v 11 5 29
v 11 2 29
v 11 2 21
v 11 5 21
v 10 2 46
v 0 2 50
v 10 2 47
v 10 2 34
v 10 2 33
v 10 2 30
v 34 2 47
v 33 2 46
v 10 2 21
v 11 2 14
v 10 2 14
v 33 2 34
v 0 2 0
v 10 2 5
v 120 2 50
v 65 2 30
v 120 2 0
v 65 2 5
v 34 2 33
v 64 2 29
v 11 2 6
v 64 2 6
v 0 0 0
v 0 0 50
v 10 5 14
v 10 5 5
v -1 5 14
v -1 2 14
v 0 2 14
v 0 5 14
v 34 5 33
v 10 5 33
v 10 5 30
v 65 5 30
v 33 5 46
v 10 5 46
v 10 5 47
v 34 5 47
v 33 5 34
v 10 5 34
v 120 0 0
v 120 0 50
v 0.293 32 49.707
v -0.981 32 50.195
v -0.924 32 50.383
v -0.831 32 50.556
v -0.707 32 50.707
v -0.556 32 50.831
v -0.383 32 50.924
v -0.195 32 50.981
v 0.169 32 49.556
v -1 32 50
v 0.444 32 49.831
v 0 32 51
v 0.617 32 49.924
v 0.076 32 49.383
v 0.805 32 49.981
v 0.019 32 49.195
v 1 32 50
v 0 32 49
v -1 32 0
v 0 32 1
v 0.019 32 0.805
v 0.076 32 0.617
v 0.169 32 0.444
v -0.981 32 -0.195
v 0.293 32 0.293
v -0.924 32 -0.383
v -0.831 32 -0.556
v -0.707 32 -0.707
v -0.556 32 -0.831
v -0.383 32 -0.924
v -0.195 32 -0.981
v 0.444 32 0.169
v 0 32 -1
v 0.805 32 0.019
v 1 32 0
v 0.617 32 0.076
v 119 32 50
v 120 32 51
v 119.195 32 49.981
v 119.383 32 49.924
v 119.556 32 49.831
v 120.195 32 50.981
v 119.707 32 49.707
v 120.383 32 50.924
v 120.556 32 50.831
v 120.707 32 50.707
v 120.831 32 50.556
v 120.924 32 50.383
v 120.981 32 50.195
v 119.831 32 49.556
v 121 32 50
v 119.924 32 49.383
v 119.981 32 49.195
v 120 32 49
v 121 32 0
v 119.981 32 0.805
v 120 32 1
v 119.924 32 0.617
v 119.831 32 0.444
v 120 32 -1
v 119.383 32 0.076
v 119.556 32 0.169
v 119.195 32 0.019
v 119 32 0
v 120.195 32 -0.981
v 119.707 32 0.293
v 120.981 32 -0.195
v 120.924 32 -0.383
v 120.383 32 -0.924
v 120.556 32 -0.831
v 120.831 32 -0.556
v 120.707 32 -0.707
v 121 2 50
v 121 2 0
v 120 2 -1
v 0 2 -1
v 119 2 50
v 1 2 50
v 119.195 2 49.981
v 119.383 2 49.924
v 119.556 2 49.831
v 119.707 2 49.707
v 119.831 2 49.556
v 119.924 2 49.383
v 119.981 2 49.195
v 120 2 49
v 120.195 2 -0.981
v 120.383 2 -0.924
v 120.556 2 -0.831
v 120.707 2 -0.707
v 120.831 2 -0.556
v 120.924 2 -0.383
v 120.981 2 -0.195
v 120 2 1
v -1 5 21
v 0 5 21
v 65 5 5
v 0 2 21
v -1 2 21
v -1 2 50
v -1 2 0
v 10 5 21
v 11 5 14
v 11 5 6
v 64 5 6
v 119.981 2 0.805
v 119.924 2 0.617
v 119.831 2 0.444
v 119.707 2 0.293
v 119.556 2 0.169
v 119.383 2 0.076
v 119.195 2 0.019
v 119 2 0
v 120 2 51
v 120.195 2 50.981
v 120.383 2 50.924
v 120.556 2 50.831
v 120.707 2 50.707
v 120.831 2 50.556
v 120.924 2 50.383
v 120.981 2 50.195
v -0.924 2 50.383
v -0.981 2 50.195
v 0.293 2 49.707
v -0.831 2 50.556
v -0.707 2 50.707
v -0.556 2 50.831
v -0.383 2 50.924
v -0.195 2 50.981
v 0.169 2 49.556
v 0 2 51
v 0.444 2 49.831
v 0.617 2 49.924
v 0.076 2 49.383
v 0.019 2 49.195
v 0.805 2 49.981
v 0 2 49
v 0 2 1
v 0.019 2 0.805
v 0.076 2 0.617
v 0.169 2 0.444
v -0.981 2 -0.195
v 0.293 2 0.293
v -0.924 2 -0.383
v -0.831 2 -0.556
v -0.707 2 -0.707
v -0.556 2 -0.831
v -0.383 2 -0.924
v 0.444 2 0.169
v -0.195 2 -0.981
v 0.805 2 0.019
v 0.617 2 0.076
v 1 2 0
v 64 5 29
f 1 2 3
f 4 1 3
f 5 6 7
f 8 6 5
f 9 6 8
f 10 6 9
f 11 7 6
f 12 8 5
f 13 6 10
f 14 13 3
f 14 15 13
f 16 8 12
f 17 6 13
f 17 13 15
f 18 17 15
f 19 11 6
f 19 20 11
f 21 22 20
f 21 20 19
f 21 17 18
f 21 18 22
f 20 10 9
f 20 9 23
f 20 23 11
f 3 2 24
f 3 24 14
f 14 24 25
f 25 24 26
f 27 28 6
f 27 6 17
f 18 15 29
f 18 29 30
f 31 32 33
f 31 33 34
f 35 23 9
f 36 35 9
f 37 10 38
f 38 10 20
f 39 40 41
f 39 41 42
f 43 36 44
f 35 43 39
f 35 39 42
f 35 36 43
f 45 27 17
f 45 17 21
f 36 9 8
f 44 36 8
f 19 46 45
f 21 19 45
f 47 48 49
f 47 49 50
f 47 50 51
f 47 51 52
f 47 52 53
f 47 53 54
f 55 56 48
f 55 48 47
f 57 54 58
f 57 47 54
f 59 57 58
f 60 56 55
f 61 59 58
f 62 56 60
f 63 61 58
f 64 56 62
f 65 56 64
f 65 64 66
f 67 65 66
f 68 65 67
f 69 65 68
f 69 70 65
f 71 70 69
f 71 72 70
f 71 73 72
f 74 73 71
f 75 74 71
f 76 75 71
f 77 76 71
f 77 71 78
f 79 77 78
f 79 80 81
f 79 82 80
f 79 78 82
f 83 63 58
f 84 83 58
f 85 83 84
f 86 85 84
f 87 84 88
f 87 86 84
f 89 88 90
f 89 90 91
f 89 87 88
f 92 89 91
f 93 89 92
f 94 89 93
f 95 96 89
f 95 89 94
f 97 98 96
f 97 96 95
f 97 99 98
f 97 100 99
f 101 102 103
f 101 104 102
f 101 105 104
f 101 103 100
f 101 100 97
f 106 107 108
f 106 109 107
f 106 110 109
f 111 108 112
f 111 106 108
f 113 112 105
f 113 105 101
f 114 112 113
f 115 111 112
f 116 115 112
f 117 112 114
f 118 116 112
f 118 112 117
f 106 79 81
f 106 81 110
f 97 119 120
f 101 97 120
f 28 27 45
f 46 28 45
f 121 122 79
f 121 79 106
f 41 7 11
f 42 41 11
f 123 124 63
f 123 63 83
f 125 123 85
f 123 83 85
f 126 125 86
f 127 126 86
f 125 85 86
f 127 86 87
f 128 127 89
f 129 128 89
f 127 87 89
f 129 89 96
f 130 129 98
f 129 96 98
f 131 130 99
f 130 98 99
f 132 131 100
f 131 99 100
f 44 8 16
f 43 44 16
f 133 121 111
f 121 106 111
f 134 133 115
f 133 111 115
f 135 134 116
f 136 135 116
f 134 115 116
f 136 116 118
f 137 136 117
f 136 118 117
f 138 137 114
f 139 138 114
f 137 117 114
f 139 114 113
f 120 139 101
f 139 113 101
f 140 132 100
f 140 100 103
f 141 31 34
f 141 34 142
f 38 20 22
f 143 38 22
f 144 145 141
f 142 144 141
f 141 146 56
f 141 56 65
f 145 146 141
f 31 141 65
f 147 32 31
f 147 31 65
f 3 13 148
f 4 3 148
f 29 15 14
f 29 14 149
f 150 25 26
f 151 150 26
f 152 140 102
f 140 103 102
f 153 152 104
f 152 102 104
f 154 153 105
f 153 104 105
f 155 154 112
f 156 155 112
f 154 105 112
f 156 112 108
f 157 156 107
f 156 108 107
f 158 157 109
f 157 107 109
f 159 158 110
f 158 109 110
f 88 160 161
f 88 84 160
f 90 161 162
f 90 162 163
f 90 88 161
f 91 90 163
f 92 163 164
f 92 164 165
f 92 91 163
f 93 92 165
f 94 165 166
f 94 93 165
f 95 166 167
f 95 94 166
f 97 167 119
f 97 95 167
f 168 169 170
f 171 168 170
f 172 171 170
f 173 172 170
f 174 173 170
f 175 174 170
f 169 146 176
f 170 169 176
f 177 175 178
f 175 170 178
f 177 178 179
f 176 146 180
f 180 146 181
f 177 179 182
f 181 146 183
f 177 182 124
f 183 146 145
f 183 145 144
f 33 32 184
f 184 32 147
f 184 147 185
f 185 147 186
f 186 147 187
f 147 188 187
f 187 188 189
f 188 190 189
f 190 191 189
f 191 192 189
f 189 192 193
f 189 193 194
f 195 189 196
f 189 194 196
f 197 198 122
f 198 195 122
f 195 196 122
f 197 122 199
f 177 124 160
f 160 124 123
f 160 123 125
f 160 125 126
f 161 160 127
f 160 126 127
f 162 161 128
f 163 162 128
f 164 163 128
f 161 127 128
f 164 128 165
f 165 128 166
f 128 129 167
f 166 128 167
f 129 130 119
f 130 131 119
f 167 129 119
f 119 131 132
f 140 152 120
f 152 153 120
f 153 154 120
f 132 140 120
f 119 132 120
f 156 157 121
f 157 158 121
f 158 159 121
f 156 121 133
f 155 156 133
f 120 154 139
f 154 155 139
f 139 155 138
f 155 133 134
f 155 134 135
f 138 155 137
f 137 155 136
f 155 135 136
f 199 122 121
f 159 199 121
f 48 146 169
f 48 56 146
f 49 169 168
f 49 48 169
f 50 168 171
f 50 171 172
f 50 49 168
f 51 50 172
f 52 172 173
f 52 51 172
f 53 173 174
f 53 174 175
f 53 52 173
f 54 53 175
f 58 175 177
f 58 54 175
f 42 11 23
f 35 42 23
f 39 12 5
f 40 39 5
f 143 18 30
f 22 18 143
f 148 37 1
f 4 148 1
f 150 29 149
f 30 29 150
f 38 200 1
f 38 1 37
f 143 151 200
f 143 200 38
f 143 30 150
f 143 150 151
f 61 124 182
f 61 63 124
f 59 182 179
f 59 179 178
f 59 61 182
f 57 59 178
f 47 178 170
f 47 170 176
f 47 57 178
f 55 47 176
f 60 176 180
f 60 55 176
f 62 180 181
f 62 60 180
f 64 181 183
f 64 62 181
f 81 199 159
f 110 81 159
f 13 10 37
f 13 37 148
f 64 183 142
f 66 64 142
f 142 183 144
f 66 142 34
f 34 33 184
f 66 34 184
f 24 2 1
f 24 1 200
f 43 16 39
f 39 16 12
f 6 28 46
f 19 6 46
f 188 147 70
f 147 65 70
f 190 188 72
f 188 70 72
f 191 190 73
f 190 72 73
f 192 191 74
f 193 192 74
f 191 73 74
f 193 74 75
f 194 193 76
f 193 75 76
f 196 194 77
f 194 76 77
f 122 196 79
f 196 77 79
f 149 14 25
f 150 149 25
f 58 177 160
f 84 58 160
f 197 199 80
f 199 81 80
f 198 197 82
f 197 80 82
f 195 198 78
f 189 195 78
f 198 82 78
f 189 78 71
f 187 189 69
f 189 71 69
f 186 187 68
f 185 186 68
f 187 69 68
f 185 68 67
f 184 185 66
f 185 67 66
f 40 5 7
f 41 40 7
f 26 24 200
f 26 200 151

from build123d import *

# Parameters (mm, degrees)
SKETCH_1_W          = 120
SKETCH_1_H          = 50
EXTRUDE_1_DEPTH     = 2
SKETCH_2_W          = 55
SKETCH_2_H          = 25
SKETCH_2_W_2        = 53
SKETCH_2_H_2        = 23
EXTRUDE_1_2_DEPTH   = 3
EXTRUDE_2_DEPTH     = 3
CUT_EXTRUDE_1_REACH = 122.934
SKETCH_4_W          = 7
SKETCH_4_H          = 3
SKETCH_5_W          = 122
SKETCH_5_H          = 52
SKETCH_5_W_2        = 120
SKETCH_5_H_2        = 50
EXTRUDE_3_DEPTH     = 30
FILLET_1_R          = 1
SKETCH_6_W          = 7
SKETCH_6_H          = 3
CUT_EXTRUDE_2_DEPTH = 1


with BuildPart() as part:
    # 草图1 → Extrude 1 (new body)
    with BuildSketch(Plane(origin=(0, 0, 0), x_dir=(1, 0, 0), z_dir=(0, 1, 0))):
        with Locations((60, -25)):
            Rectangle(SKETCH_1_W, SKETCH_1_H)
    extrude(amount=EXTRUDE_1_DEPTH)

    # 草图2 → Extrude 1 2 (add)
    with BuildSketch(Plane(origin=(0, 2, 0), x_dir=(1, 0, 0), z_dir=(0, 1, 0))):
        with Locations((37.5, -17.5)):
            Rectangle(SKETCH_2_W, SKETCH_2_H)
        with Locations((37.5, -17.5)):
            Rectangle(SKETCH_2_W_2, SKETCH_2_H_2, mode=Mode.SUBTRACT)
    extrude(amount=EXTRUDE_1_2_DEPTH)

    # 草图3 → 拉伸-薄壁2 (add)
    with BuildSketch(Plane(origin=(0, 2, 0), x_dir=(1, 0, 0), z_dir=(0, 1, 0))):
        Polygon((10, -34), (33, -34), (33, -46), (10, -46), (10, -47), (34, -47), (34, -33), (10, -33), align=None)
    extrude(amount=EXTRUDE_2_DEPTH)

    # 草图4 → 切除-拉伸1 (cut, up to next)
    with BuildSketch(Plane.ZY.offset(-10), mode=Mode.PRIVATE) as cut_extrude_1_sk1:
        with Locations((17.5, 3.5)):
            Rectangle(SKETCH_4_W, SKETCH_4_H)
    cut_extrude_1_tool1 = extrude(cut_extrude_1_sk1.sketch, amount=-CUT_EXTRUDE_1_REACH, mode=Mode.PRIVATE) & part.part
    add(cut_extrude_1_tool1.solids().sort_by_distance((10, 3.5, 17.5))[0], mode=Mode.SUBTRACT)


with BuildPart() as body_2:
    # 草图5 → 拉伸-薄壁3 (new body)
    with BuildSketch(Plane(origin=(0, 2, 0), x_dir=(1, 0, 0), z_dir=(0, 1, 0))):
        with Locations((60, -25)):
            Rectangle(SKETCH_5_W, SKETCH_5_H)
        with Locations((60, -25)):
            Rectangle(SKETCH_5_W_2, SKETCH_5_H_2, mode=Mode.SUBTRACT)
    extrude(amount=EXTRUDE_3_DEPTH)

    # 圆角1
    fillet_1_edges = [body_2.edges().sort_by_distance(p)[0] for p in [
        (120, 17, 50),
        (120, 17, 0),
        (0, 17, 0),
        (0, 17, 50),
        (121, 17, 51),
        (-1, 17, 51),
        (-1, 17, -1),
        (121, 17, -1),
    ]]
    fillet(fillet_1_edges, radius=FILLET_1_R)

    # 草图6 → 切除-拉伸2 (cut)
    with BuildSketch(Plane.ZY.offset(1)):
        with Locations((17.5, 3.5)):
            Rectangle(SKETCH_6_W, SKETCH_6_H)
    extrude(amount=-CUT_EXTRUDE_2_DEPTH, mode=Mode.SUBTRACT)


solid = Compound([part.part, body_2.part])
